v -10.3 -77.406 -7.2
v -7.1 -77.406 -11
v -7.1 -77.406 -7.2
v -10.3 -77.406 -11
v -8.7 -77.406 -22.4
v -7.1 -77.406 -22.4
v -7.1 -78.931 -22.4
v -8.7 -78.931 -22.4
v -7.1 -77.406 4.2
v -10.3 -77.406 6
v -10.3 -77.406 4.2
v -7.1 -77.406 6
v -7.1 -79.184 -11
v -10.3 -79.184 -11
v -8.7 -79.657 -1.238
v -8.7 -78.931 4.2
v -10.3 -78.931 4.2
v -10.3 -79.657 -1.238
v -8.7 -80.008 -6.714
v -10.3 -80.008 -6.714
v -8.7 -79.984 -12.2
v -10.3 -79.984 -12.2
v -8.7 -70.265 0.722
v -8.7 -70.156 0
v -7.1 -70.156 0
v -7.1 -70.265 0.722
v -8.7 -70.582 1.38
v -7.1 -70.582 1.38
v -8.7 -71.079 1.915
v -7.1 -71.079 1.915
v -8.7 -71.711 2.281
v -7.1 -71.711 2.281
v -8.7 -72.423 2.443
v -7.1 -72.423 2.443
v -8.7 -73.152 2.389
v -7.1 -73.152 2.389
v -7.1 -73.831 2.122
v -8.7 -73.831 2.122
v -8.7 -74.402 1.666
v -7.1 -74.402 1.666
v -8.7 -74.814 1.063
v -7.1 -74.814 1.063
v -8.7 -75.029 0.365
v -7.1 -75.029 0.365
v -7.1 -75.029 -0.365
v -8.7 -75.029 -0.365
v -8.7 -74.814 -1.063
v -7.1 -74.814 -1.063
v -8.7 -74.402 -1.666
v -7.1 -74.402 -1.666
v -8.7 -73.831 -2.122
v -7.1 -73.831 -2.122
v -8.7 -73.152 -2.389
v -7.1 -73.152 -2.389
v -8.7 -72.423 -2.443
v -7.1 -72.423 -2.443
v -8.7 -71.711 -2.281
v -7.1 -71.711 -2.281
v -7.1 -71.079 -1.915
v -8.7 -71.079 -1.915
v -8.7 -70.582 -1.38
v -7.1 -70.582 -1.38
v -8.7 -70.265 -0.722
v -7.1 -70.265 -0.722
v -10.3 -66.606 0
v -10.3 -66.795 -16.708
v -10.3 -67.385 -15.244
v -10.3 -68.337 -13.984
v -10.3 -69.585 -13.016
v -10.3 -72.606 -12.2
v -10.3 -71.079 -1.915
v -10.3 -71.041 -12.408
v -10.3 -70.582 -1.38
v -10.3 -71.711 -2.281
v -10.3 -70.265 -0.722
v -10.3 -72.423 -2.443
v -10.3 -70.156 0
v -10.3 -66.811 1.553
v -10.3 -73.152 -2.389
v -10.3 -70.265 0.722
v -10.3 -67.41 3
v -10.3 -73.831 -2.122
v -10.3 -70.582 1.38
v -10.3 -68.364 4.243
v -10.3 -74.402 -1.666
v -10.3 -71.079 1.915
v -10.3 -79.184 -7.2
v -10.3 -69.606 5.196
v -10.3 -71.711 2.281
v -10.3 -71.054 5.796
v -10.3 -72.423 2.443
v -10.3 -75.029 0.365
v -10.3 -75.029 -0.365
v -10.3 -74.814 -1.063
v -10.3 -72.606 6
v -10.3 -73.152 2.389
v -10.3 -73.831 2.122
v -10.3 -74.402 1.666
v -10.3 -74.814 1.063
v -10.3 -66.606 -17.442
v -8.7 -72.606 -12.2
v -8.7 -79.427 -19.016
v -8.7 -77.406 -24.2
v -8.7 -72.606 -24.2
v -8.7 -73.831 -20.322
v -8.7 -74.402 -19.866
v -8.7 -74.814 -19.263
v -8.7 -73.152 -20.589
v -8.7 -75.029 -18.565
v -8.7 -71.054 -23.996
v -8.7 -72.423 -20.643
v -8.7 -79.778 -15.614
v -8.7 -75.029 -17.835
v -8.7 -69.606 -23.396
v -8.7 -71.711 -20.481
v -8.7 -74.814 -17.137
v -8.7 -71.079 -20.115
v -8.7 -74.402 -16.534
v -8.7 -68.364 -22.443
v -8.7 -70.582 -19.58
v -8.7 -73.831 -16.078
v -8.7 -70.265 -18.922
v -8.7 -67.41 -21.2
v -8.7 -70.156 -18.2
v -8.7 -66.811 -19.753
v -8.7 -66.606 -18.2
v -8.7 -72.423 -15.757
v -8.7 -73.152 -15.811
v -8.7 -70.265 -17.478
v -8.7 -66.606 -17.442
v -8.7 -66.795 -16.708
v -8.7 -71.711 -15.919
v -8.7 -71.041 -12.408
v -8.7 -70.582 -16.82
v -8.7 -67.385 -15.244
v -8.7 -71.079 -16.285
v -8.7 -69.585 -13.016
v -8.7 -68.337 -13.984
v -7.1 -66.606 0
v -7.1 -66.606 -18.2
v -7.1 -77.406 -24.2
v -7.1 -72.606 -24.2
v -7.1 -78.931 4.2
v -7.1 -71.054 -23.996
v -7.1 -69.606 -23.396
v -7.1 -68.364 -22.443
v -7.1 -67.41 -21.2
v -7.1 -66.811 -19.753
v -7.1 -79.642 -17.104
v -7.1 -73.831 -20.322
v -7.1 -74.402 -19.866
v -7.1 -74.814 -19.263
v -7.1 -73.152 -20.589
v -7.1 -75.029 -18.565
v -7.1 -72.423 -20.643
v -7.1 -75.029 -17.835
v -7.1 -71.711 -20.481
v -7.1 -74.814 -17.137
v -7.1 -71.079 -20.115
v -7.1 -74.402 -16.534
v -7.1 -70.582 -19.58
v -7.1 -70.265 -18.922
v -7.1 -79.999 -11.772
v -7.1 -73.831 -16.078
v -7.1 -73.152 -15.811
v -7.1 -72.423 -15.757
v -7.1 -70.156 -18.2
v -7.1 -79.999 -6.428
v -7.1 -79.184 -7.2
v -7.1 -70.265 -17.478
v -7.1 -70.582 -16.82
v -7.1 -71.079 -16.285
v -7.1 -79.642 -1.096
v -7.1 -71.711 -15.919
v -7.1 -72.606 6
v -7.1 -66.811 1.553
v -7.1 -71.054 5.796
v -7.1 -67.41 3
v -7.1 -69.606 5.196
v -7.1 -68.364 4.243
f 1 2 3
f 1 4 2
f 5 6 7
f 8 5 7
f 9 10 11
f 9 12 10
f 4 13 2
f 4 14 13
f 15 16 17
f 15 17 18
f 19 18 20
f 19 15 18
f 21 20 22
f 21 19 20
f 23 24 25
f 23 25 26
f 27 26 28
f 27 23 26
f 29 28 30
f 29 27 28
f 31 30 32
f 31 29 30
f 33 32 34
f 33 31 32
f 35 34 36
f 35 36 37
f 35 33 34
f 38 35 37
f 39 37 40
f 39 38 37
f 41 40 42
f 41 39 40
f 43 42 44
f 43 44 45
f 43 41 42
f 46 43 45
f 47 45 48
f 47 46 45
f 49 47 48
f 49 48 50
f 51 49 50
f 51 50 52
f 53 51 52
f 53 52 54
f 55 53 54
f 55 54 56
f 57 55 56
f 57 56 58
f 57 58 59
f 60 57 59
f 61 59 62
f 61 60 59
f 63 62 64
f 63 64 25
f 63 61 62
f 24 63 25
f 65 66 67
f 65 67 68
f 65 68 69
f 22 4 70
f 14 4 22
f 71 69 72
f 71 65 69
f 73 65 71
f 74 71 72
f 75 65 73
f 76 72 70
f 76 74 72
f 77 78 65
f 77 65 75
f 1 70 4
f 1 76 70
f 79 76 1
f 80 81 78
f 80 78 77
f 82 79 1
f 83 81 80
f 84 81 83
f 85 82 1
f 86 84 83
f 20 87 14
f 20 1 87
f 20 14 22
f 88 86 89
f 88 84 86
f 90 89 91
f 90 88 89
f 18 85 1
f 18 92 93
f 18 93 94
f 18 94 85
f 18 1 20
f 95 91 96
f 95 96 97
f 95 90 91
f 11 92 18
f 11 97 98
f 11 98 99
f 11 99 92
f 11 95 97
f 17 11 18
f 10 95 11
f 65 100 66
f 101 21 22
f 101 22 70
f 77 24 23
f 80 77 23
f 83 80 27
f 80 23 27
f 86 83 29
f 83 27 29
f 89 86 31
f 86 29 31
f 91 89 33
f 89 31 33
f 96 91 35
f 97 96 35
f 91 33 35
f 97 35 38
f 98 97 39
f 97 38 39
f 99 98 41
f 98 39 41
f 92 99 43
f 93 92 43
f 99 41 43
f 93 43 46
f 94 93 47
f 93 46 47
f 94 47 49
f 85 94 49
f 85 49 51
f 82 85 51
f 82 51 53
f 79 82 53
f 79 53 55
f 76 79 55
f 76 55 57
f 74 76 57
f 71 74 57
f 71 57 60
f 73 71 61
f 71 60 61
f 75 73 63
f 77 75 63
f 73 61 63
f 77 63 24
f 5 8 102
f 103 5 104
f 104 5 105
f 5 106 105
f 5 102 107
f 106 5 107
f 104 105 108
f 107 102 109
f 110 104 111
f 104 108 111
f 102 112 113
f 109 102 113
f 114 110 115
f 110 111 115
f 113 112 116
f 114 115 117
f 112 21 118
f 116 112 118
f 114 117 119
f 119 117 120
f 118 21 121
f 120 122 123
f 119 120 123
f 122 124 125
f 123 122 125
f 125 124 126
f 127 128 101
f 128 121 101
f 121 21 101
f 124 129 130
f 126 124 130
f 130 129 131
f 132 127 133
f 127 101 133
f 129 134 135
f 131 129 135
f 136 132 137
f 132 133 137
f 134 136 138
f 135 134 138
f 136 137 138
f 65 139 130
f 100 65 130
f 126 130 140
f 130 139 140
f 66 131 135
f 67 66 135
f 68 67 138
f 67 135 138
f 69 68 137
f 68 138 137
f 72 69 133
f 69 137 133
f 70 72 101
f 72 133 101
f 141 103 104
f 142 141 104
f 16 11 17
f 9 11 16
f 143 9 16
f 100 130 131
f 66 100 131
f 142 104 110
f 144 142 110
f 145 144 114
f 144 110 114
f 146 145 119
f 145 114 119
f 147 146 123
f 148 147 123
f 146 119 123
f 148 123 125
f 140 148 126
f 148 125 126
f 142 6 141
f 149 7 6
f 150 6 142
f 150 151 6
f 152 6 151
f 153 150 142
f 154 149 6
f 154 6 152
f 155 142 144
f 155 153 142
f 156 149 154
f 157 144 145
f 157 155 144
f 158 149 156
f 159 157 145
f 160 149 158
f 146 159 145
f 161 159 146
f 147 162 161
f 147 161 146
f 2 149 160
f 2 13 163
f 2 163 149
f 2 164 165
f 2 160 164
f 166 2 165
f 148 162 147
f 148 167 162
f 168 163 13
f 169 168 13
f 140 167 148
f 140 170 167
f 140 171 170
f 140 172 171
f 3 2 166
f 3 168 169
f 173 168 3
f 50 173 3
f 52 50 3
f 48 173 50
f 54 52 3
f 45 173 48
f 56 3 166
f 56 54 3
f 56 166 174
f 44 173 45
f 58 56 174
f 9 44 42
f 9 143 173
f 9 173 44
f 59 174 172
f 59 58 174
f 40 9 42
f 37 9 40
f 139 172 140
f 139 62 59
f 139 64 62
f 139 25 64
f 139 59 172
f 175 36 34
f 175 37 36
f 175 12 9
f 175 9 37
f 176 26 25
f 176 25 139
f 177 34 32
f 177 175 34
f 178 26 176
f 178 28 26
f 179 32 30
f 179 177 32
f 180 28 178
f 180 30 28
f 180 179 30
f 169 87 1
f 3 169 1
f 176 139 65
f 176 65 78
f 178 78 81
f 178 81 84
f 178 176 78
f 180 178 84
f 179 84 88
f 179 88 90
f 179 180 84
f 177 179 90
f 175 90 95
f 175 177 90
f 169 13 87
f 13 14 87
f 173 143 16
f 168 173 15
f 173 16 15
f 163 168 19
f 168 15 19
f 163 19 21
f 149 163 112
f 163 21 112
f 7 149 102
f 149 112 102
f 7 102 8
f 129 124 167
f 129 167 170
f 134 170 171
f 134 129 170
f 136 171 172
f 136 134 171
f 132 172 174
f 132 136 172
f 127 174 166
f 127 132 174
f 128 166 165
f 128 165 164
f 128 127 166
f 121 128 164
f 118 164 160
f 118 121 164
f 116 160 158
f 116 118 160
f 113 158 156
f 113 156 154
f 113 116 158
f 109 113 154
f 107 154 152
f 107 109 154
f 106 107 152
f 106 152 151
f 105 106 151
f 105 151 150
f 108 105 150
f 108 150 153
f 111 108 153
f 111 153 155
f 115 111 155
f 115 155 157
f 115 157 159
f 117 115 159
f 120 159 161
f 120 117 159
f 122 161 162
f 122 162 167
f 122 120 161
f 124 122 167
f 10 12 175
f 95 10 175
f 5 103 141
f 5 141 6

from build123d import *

# Parameters (mm, degrees)
SKETCH037_R     = 2.45
PAD019_DEPTH    = 1.6
SKETCH038_R     = 2.45
PAD020_DEPTH    = 1.6
SKETCH062_W     = 1.7771358599
SKETCH062_H     = 3.8
POCKET024_DEPTH = 1.6


with BuildPart() as part:
    # Sketch037 → Pad019 (new body)
    with BuildSketch(Plane.YZ.offset(-8.7)):
        with BuildLine():
            ThreePointArc((-6, 6), (-7.4371881489, -9.1), (-6, -24.2))
            Line((-6, -24.2), (0, -24.2))
            ThreePointArc((0, -24.2), (4.2426406871, -22.4426406871), (6, -18.2))
            Line((6, 0), (6, -18.2))
            ThreePointArc((6, 0), (4.2426406871, 4.2426406871), (0, 6))
            Line((-6, 6), (0, 6))
        make_face()
        Circle(SKETCH037_R, mode=Mode.SUBTRACT)
        with Locations((0, -18.2)):
            Circle(SKETCH037_R, mode=Mode.SUBTRACT)
    extrude(amount=PAD019_DEPTH)

    # Sketch038 → Pad020 (join)
    with BuildSketch(Plane.YZ.offset(-8.7)):
        with BuildLine():
            ThreePointArc((5.8114989668, -16.707860677), (3.6774423219, -13.4590699257), (0, -12.2))
            Line((-7.3771358599, -12.2), (0, -12.2))
            ThreePointArc((-6, 6), (-7.2090239265, -3.0606187573), (-7.3771358599, -12.2))
            Line((-6, 6), (0, 6))
            ThreePointArc((6, 0), (4.2426406871, 4.2426406871), (0, 6))
            Line((6, 0), (6, -17.4420237293))
            Line((6, -17.4420237293), (5.8114989668, -16.707860677))
        make_face()
        Circle(SKETCH038_R, mode=Mode.SUBTRACT)
    extrude(amount=-PAD020_DEPTH)

    # Sketch062 → Pocket024 (cut, symmetric)
    with BuildSketch(Plane.YZ.offset(-8.7)):
        with BuildLine():
            ThreePointArc((-6.3244944235, -22.4), (-6.167388681, -23.3009268767), (-6, -24.2))
            Line((-6, -24.2), (-4.8, -24.2))
            Line((-4.8, -24.2), (-4.8, -22.4))
            Line((-4.8, -22.4), (-6.3244944235, -22.4))
        make_face()
        with Locations((-5.68856793, -9.1)):
            Rectangle(SKETCH062_W, SKETCH062_H)
        with BuildLine():
            Line((-6, 6), (-4.8, 6))
            Line((-4.8, 6), (-4.8, 4.2))
            Line((-4.8, 4.2), (-6.3244944235, 4.2))
            ThreePointArc((-6, 6), (-6.167388681, 5.1009268767), (-6.3244944235, 4.2))
        make_face()
    extrude(amount=POCKET024_DEPTH, both=True, mode=Mode.SUBTRACT)


with BuildPart() as part_1:
    # Body017 placement: moved
    add(part.part.moved(Location((0, -72.6064407756, 0))))


solid = part_1.part
